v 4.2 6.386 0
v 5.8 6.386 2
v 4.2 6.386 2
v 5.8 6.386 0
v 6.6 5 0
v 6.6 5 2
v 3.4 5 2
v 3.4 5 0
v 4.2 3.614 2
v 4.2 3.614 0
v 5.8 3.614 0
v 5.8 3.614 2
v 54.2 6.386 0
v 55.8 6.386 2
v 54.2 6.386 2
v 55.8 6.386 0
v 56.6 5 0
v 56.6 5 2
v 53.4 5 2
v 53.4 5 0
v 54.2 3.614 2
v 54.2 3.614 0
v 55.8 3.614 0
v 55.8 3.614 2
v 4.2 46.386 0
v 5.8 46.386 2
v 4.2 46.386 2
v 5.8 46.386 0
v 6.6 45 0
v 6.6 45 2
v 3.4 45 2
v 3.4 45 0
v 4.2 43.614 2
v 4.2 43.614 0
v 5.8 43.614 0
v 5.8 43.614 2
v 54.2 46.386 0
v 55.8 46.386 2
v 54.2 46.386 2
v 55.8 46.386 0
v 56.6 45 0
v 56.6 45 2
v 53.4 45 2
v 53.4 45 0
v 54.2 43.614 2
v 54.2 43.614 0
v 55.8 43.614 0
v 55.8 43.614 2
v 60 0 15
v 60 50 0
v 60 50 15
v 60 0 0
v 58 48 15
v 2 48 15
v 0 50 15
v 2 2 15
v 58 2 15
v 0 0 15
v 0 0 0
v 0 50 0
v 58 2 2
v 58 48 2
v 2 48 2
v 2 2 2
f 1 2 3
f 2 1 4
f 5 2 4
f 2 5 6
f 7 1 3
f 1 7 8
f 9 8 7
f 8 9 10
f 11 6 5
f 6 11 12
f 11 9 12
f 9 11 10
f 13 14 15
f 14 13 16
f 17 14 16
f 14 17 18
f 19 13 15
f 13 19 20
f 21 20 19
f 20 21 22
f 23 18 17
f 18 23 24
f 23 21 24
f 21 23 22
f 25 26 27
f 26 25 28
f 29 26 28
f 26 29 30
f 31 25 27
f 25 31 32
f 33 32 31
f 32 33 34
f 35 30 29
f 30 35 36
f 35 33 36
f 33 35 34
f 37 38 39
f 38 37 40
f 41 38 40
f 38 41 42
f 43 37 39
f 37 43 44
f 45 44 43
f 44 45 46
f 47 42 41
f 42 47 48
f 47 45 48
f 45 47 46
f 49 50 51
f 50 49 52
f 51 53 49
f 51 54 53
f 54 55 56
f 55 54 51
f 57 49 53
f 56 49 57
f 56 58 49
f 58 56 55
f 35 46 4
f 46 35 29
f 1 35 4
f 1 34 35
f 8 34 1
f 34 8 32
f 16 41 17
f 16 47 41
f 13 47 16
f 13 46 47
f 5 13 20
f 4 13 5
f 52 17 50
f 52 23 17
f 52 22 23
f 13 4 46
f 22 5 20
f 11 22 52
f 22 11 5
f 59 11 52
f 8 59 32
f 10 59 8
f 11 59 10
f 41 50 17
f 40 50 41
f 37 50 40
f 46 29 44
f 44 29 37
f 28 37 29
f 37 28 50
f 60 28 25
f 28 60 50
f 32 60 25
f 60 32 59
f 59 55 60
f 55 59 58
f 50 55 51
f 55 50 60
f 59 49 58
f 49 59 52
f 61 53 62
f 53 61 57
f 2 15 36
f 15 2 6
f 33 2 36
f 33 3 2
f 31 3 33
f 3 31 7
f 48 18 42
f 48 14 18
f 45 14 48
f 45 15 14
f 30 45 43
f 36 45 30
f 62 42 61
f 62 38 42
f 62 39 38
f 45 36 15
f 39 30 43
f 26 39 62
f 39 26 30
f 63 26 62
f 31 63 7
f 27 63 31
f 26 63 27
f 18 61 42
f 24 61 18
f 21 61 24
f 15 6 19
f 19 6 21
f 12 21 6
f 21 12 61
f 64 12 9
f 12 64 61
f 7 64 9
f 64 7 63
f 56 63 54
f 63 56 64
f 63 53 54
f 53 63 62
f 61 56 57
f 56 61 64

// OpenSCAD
// 📡 Supporto ESP32 DevKit
// Modello OpenSCAD

// Parametri
width = 60;
depth = 50;
height = 15;
wall = 2;
mount_hole = 3.2; // M3

module supporto_esp32() {
    difference() {
        // Base
        cube([width, depth, height]);
        
        // Fori montaggio (4 angoli)
        positions = [
            [5, 5],
            [width - 5, 5],
            [5, depth - 5],
            [width - 5, depth - 5]
        ];
        
        for (pos = positions) {
            translate([pos[0], pos[1], -1])
                cylinder(h = height + 2, r = mount_hole/2);
        }
        
        // Cavità per ESP32
        translate([wall, wall, wall])
            cube([width - 2*wall, depth - 2*wall, height]);
    }
}

// Render
supporto_esp32();
